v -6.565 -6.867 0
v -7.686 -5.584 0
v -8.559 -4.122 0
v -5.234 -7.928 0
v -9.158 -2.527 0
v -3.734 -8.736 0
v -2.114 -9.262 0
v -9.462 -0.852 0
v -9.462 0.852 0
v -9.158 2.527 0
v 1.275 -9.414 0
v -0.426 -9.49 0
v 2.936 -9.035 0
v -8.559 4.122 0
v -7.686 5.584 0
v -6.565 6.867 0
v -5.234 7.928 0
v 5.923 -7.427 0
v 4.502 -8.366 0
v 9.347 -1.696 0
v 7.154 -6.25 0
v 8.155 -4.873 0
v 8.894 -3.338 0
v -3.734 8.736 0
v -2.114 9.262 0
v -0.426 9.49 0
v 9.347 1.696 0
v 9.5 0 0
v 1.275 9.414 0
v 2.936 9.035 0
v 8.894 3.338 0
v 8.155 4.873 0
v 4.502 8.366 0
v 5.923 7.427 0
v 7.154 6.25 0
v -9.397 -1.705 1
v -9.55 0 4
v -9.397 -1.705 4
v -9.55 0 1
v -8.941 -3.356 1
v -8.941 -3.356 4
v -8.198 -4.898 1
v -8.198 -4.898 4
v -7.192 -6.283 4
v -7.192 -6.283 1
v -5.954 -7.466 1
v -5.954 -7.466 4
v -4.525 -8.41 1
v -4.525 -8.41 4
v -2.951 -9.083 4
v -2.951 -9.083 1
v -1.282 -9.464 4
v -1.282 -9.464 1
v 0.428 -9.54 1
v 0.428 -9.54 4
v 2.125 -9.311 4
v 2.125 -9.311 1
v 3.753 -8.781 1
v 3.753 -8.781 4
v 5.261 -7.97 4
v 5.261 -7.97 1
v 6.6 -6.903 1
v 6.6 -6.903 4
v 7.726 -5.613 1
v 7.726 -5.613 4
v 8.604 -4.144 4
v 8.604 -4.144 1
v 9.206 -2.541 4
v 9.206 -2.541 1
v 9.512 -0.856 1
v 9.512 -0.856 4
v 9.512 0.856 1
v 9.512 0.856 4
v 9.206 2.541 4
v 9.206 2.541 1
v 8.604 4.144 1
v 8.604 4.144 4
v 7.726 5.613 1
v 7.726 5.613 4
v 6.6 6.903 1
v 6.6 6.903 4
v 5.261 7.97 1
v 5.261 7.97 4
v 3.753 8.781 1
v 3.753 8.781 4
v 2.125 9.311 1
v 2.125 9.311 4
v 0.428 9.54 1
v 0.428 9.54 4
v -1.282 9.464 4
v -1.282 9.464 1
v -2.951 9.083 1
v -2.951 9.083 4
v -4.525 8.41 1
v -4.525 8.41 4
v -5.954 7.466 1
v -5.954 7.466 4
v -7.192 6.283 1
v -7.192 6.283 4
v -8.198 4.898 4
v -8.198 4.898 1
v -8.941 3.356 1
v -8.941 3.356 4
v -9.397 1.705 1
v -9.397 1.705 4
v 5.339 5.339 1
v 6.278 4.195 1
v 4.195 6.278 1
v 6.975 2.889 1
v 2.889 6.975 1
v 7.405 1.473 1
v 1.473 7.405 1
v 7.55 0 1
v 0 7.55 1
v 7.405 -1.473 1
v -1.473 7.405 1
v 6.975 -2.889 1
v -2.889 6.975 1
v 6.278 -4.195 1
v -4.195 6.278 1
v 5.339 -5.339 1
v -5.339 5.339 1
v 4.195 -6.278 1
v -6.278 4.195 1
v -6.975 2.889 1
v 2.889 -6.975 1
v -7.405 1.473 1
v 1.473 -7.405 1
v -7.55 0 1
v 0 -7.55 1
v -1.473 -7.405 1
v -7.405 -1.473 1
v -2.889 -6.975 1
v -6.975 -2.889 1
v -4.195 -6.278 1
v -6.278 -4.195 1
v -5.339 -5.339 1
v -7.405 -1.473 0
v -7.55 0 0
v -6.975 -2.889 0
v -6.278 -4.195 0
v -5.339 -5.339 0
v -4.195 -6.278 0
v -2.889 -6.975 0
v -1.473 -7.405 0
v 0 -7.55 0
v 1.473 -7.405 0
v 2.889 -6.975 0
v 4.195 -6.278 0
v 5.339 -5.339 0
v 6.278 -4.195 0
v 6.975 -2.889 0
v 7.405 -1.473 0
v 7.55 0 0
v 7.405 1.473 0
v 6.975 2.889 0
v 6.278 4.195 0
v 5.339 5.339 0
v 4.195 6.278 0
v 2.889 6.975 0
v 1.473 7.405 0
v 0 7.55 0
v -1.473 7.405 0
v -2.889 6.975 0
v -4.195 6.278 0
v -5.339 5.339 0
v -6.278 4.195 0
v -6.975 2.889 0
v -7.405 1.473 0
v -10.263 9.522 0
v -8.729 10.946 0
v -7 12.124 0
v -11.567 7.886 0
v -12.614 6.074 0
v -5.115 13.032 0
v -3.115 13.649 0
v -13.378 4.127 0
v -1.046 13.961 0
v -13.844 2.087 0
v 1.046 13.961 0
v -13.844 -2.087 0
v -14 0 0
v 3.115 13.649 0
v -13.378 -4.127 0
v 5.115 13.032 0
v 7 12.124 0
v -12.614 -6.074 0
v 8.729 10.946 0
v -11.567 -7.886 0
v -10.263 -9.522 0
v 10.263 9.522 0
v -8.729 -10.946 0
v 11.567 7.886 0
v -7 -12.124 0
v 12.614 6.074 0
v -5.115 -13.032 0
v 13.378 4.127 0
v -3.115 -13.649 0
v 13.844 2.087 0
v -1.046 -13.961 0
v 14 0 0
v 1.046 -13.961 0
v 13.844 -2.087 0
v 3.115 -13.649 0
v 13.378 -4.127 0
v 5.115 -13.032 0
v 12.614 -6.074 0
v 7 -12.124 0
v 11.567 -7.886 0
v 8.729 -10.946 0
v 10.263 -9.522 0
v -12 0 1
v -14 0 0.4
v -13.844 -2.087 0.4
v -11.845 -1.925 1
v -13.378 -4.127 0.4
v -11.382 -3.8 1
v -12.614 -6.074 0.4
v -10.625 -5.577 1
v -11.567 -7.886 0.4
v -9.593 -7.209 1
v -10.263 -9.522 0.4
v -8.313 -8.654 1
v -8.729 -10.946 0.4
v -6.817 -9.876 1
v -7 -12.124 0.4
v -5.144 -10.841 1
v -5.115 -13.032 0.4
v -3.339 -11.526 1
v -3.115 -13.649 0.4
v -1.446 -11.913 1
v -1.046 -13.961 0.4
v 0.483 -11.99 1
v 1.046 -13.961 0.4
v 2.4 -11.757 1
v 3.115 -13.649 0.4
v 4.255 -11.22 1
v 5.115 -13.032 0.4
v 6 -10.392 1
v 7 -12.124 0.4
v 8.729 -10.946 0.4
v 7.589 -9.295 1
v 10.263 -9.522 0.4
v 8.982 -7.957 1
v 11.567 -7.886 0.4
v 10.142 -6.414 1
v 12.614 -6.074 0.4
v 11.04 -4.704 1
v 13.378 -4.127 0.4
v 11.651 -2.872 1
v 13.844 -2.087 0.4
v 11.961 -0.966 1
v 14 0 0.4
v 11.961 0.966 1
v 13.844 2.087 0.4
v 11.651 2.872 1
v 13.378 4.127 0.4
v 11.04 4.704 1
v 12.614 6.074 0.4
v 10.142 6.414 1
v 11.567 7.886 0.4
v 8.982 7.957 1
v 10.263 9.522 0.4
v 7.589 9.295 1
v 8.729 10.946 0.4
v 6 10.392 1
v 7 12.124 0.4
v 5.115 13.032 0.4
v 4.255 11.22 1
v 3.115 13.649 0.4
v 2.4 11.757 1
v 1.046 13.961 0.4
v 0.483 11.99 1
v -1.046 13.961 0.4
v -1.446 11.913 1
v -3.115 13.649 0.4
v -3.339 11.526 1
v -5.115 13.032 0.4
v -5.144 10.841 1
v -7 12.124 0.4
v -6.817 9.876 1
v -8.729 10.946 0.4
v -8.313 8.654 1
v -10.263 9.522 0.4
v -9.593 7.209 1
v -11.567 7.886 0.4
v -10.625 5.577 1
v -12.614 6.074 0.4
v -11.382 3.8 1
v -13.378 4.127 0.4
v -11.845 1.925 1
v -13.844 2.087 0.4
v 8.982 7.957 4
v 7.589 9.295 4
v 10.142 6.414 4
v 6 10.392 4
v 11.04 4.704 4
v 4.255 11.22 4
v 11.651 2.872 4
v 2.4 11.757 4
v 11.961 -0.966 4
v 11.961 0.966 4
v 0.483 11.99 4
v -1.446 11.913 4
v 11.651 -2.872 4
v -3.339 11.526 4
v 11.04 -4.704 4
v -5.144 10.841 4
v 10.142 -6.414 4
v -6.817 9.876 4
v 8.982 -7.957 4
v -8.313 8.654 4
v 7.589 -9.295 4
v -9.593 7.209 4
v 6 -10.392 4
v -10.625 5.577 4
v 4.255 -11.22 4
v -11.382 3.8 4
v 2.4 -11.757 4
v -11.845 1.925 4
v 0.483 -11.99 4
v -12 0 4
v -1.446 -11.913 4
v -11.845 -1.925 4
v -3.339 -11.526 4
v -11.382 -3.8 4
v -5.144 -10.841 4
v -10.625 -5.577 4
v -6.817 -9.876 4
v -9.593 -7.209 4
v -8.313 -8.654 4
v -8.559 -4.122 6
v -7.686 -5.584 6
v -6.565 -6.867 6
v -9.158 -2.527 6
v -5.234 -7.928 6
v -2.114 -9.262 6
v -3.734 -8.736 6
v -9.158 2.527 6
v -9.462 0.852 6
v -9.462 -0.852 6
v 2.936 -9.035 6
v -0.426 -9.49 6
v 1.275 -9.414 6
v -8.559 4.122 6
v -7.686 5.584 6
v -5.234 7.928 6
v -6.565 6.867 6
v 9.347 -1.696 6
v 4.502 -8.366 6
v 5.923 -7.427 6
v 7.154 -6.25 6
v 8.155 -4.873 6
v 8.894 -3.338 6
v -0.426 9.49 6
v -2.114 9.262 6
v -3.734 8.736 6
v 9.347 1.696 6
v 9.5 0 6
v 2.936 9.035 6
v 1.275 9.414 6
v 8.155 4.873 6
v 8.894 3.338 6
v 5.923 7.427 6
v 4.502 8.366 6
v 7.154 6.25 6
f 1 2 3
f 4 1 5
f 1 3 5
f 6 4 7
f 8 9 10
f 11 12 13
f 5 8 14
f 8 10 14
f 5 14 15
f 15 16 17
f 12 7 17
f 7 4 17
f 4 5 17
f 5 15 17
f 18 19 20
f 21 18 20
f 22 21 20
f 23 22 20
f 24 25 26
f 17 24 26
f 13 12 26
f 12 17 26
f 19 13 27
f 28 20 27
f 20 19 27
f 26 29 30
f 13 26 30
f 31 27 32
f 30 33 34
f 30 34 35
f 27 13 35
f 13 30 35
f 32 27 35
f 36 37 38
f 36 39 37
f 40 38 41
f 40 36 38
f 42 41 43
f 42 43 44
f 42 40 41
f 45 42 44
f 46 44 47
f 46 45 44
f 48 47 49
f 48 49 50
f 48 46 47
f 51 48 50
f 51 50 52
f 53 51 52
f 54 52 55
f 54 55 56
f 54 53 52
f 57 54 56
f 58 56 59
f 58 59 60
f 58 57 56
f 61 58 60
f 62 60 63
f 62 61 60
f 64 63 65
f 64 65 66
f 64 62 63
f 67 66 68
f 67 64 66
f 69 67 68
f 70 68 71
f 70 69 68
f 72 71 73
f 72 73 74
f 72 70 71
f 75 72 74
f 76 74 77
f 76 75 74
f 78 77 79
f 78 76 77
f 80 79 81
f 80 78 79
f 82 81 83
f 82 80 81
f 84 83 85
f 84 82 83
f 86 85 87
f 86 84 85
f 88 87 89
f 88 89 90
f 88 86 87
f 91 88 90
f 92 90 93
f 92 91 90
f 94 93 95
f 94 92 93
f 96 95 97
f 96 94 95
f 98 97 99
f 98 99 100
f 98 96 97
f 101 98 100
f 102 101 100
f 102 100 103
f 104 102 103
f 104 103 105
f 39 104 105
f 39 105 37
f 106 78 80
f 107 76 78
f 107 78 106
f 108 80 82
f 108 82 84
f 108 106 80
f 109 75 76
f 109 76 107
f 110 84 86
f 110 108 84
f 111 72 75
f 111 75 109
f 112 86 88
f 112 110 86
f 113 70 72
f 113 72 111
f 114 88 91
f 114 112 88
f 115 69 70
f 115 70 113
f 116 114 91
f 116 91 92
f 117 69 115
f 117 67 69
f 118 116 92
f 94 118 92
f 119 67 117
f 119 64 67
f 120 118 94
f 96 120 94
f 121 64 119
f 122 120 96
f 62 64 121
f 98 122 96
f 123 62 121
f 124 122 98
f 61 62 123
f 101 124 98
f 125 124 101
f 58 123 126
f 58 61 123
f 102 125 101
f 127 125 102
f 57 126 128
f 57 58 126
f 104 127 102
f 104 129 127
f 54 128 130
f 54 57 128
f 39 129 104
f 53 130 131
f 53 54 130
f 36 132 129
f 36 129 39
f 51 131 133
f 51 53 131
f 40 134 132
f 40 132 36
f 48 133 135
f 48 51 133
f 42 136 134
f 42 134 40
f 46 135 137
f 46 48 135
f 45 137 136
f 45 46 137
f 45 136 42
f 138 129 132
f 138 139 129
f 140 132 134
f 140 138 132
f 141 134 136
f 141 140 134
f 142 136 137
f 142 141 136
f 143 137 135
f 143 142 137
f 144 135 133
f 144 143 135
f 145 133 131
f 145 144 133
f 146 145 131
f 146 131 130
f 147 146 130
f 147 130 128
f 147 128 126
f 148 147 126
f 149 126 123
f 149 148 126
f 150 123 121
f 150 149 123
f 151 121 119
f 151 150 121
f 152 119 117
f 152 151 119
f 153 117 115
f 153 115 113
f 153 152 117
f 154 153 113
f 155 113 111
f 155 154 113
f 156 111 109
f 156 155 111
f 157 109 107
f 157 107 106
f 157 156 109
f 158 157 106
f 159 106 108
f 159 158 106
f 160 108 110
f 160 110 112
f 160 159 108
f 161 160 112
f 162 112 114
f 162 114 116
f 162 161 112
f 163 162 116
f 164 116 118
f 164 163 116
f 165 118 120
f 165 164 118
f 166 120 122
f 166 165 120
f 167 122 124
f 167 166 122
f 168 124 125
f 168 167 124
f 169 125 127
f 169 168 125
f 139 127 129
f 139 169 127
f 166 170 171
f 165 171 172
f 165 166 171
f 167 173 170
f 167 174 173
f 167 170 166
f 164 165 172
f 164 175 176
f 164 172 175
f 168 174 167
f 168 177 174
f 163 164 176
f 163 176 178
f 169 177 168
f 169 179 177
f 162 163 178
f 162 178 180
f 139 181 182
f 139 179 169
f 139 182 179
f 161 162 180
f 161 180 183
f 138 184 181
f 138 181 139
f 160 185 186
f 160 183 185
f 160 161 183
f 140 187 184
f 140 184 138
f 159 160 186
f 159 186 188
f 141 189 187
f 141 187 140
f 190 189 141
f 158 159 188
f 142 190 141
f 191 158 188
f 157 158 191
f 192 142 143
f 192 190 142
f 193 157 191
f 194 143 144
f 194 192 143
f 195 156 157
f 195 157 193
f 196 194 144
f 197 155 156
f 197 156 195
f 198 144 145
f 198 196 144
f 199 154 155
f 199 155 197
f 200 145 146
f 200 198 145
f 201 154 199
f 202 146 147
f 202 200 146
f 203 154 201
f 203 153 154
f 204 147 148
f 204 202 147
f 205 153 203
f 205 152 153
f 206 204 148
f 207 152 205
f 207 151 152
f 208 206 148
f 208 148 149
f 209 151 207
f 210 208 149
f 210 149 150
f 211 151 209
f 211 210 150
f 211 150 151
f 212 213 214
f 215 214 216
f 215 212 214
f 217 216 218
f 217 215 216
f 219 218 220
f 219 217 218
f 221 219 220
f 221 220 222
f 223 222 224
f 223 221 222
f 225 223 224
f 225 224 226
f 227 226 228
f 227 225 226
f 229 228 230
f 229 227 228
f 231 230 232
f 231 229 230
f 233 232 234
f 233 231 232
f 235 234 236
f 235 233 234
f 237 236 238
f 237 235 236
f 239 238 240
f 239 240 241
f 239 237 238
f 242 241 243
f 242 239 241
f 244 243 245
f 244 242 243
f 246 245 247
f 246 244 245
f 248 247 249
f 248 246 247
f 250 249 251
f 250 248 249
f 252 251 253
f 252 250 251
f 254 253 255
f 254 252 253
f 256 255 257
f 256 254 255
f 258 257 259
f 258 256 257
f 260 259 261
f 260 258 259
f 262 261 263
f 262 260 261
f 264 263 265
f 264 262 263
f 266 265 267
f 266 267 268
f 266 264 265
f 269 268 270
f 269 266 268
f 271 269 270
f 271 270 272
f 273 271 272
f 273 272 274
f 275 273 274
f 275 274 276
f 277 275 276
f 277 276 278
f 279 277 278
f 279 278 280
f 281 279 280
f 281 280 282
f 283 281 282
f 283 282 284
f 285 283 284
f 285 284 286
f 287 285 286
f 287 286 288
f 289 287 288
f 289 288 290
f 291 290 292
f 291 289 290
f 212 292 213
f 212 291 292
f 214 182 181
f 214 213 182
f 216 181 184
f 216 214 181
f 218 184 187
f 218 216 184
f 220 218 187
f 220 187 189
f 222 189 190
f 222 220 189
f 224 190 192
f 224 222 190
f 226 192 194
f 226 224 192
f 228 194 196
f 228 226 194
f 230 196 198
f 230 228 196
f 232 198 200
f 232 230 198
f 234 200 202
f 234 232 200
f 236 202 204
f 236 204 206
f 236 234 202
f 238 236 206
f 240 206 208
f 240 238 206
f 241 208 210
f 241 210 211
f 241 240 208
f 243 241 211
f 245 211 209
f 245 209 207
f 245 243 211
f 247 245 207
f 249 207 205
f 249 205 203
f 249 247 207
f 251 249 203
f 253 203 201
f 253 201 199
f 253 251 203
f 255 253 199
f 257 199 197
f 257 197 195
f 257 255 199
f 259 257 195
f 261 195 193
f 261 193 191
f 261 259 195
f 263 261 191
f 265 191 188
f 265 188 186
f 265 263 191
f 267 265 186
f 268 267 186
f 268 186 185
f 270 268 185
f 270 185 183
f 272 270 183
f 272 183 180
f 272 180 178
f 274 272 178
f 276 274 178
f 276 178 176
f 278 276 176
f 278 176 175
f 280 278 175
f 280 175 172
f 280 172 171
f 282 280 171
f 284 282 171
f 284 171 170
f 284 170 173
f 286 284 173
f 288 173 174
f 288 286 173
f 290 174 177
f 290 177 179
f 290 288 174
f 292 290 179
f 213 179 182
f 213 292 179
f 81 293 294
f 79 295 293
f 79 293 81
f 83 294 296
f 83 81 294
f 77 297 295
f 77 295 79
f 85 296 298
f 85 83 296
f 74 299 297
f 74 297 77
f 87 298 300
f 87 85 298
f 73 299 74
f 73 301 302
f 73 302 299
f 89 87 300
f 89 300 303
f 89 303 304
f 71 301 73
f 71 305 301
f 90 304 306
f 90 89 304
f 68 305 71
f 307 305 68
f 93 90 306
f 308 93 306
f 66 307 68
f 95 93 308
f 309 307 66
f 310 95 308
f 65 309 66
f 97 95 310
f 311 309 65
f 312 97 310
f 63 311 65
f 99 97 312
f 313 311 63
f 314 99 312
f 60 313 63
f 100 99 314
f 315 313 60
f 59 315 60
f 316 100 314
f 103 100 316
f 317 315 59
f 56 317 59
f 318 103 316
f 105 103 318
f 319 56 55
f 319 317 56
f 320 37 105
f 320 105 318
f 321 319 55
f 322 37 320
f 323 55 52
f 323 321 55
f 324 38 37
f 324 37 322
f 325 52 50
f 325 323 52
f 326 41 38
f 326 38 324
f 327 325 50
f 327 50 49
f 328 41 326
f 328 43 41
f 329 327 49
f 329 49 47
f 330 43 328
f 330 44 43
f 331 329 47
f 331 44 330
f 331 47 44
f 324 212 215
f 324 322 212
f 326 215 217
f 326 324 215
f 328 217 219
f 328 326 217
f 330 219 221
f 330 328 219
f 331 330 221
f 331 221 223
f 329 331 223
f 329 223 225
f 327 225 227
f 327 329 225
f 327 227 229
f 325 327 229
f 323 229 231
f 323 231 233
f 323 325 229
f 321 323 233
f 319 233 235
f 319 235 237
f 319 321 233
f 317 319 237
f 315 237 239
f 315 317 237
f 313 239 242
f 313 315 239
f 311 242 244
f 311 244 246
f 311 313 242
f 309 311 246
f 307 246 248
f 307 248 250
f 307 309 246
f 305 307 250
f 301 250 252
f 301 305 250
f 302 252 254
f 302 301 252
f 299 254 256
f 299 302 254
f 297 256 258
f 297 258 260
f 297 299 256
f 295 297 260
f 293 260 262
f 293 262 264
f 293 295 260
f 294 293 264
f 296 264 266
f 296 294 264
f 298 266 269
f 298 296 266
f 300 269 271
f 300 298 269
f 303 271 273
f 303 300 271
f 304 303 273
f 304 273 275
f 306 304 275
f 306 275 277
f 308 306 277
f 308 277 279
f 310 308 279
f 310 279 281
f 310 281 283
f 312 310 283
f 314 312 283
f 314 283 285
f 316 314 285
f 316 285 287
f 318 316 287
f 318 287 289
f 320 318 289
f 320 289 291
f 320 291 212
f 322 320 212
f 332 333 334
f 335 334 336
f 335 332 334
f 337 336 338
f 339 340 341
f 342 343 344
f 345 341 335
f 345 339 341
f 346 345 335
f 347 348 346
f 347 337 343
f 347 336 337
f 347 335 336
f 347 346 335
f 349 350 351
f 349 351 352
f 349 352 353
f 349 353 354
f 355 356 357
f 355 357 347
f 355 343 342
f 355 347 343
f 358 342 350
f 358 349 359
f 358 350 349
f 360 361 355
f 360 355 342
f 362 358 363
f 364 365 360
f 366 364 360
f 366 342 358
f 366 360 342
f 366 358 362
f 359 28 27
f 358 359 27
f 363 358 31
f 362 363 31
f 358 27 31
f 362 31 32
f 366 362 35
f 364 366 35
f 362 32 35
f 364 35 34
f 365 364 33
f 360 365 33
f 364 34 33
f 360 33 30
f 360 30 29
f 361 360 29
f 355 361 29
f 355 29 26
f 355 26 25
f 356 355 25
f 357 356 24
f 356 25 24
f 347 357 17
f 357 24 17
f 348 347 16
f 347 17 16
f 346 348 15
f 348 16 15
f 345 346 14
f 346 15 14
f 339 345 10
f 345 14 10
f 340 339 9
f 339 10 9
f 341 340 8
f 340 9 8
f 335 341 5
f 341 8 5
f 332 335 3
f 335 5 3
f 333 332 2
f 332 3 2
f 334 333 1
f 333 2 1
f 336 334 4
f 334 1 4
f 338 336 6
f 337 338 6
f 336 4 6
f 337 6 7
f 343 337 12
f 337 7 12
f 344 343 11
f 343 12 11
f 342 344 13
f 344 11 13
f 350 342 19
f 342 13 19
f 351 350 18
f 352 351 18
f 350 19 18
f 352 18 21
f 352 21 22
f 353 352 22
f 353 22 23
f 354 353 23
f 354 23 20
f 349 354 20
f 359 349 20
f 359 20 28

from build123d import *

# Parameters (mm, degrees)
CYLINDER_R     = 9.5
CYLINDER_DEPTH = 6


with BuildPart() as cylinder:
    # Cylinder → Cylinder (new body)
    with BuildSketch(Plane.XY):
        Circle(CYLINDER_R)
    extrude(amount=CYLINDER_DEPTH)


with BuildPart() as revolution:
    # Sketch → Revolution (revolve)
    with BuildSketch(Plane.XZ):
        Polygon((-14, 0), (-14, 0.4), (-12, 1), (-12, 4), (-9.55, 4), (-9.55, 1), (-7.55, 1), (-7.55, 0), align=None)
    revolve(axis=Axis((0, 0, 0), (0, 0, 1)))


solid = Compound([cylinder.part, revolution.part])
